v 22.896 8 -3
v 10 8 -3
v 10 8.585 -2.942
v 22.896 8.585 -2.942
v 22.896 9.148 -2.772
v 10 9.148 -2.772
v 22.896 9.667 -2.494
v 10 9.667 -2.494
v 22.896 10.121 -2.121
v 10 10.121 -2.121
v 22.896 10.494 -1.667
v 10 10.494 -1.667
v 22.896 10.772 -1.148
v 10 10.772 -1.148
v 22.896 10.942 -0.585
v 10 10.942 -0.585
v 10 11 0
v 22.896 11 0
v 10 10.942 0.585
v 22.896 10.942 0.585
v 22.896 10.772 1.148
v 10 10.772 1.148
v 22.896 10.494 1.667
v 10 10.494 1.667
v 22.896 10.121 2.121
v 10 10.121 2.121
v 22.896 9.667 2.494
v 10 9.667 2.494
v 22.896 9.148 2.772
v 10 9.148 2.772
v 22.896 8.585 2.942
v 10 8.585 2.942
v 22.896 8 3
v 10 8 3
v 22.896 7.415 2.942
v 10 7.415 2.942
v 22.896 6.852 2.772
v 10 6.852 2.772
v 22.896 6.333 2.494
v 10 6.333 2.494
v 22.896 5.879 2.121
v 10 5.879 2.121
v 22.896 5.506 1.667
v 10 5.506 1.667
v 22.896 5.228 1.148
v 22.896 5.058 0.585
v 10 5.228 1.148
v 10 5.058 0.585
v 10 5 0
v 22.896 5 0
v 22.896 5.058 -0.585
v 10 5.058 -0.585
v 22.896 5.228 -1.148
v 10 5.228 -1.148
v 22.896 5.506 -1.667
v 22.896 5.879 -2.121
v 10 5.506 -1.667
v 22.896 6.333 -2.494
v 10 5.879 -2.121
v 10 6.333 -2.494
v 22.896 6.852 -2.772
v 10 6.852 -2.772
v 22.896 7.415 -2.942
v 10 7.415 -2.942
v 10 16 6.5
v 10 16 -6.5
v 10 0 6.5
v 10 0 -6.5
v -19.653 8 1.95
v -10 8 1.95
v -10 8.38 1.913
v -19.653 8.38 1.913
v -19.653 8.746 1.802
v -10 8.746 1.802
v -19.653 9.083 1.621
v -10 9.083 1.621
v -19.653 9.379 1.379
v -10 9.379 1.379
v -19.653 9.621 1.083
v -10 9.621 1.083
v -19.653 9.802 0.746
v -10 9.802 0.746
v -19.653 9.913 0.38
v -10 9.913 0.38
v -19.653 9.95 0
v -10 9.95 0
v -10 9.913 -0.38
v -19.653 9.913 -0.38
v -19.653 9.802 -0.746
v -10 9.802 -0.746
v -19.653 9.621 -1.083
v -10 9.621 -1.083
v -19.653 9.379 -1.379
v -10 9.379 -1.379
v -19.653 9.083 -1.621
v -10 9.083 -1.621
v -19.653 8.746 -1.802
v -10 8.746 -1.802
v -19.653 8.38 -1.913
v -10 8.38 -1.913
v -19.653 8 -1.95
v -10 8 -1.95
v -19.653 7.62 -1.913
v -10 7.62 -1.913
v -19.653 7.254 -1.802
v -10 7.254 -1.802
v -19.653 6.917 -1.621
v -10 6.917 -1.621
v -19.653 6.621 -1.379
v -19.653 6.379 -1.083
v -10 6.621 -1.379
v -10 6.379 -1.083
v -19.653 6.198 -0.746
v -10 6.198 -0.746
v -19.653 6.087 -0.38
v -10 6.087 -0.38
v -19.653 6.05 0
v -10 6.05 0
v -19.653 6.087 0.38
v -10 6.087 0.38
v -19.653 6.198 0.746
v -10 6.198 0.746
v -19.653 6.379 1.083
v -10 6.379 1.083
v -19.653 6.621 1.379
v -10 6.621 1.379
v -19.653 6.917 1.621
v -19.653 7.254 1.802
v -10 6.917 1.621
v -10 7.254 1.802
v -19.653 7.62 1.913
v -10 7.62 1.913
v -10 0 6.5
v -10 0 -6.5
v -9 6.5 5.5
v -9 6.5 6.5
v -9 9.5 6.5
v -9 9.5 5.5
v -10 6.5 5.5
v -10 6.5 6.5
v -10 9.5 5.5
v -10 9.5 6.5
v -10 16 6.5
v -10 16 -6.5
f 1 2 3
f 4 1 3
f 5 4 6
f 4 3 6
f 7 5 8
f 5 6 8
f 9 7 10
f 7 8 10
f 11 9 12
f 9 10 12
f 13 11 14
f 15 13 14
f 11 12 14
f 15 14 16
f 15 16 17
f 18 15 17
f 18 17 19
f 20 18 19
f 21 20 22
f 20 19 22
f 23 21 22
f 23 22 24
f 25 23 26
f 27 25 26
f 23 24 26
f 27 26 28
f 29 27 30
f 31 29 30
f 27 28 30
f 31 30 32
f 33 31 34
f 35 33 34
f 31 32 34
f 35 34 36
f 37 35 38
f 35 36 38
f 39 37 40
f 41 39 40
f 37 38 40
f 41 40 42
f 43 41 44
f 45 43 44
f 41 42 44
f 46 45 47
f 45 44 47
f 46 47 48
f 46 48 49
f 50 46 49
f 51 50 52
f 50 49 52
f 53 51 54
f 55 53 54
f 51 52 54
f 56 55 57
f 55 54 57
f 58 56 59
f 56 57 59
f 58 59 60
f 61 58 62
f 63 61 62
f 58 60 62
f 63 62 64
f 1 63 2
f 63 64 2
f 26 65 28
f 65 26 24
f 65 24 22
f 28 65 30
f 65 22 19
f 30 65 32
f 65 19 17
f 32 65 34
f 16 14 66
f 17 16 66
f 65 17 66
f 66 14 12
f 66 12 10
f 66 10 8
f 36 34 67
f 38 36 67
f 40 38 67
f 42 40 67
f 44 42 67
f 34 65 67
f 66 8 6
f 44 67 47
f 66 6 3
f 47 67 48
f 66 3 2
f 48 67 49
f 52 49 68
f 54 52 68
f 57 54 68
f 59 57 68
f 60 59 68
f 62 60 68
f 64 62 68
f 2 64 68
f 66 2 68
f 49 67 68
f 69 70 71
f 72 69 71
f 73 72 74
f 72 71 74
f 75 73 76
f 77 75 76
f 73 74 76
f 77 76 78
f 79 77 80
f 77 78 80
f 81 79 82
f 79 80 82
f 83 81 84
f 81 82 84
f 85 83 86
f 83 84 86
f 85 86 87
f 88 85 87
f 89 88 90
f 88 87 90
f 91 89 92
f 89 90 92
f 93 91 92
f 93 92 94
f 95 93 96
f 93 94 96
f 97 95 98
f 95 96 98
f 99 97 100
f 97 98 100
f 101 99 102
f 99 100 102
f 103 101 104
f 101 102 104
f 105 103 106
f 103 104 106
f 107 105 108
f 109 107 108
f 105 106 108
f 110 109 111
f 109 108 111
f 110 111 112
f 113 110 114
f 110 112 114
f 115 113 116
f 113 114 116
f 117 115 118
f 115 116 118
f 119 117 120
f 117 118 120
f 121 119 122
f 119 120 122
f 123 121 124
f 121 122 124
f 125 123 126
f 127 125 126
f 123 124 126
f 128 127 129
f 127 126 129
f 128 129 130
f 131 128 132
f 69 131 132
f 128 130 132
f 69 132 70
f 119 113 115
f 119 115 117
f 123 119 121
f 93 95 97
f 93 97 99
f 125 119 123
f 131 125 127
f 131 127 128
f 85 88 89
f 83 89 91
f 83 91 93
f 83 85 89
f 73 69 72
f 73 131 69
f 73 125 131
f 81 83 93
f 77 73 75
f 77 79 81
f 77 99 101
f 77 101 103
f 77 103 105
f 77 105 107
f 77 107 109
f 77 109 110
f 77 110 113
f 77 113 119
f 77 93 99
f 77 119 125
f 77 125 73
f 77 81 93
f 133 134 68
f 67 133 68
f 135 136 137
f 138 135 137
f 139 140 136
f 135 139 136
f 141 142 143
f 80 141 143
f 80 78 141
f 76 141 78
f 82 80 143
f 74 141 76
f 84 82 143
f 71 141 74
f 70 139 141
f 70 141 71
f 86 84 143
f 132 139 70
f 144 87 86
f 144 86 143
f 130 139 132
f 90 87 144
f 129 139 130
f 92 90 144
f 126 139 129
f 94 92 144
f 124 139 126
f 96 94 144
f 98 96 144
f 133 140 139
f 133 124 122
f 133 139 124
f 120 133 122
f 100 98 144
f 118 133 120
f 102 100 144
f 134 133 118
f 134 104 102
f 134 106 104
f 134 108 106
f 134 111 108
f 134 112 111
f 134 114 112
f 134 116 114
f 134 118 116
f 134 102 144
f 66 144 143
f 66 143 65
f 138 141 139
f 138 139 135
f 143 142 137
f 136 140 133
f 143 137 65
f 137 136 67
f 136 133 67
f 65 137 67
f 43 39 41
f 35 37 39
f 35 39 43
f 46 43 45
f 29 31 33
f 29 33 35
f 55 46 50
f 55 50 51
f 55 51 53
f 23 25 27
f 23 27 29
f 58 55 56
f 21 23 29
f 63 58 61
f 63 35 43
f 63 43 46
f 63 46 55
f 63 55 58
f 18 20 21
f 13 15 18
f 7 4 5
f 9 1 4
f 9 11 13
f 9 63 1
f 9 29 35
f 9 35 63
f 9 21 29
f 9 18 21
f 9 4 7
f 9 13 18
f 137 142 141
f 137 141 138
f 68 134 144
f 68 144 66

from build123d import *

# Parameters (mm, degrees)
SKETCH1_W           = 20
SKETCH1_H           = 13
BOSS_EXTRUDE1_DEPTH = 16
SKETCH2_R           = 1.95
BOSS_EXTRUDE2_DEPTH = 9.652509653
SKETCH3_R           = 3
BOSS_EXTRUDE3_DEPTH = 12.895752896
SKETCH4_W           = 1
SKETCH4_H           = 3
CUT_EXTRUDE1_DEPTH  = 1


with BuildPart() as part:
    # Sketch1 → Boss-Extrude1 (new body)
    with BuildSketch(Plane(origin=(0, 0, 0), x_dir=(1, 0, 0), z_dir=(0, 1, 0))):
        Rectangle(SKETCH1_W, SKETCH1_H)
    extrude(amount=BOSS_EXTRUDE1_DEPTH)

    # Sketch2 → Boss-Extrude2 (add)
    with BuildSketch(Plane.ZY.offset(10)):
        with Locations((0, 8)):
            Circle(SKETCH2_R)
    extrude(amount=BOSS_EXTRUDE2_DEPTH)

    # Sketch3 → Boss-Extrude3 (add)
    with BuildSketch(Plane(origin=(10, 0, 0), x_dir=(0, 0, -1), z_dir=(1, 0, 0))):
        with Locations((0, 8)):
            Circle(SKETCH3_R)
    extrude(amount=BOSS_EXTRUDE3_DEPTH)

    # Sketch4 → Cut-Extrude1 (cut)
    with BuildSketch(Plane.XY.offset(6.5)):
        with Locations((-9.5, 8)):
            Rectangle(SKETCH4_W, SKETCH4_H)
    extrude(amount=-CUT_EXTRUDE1_DEPTH, mode=Mode.SUBTRACT)


solid = part.part
